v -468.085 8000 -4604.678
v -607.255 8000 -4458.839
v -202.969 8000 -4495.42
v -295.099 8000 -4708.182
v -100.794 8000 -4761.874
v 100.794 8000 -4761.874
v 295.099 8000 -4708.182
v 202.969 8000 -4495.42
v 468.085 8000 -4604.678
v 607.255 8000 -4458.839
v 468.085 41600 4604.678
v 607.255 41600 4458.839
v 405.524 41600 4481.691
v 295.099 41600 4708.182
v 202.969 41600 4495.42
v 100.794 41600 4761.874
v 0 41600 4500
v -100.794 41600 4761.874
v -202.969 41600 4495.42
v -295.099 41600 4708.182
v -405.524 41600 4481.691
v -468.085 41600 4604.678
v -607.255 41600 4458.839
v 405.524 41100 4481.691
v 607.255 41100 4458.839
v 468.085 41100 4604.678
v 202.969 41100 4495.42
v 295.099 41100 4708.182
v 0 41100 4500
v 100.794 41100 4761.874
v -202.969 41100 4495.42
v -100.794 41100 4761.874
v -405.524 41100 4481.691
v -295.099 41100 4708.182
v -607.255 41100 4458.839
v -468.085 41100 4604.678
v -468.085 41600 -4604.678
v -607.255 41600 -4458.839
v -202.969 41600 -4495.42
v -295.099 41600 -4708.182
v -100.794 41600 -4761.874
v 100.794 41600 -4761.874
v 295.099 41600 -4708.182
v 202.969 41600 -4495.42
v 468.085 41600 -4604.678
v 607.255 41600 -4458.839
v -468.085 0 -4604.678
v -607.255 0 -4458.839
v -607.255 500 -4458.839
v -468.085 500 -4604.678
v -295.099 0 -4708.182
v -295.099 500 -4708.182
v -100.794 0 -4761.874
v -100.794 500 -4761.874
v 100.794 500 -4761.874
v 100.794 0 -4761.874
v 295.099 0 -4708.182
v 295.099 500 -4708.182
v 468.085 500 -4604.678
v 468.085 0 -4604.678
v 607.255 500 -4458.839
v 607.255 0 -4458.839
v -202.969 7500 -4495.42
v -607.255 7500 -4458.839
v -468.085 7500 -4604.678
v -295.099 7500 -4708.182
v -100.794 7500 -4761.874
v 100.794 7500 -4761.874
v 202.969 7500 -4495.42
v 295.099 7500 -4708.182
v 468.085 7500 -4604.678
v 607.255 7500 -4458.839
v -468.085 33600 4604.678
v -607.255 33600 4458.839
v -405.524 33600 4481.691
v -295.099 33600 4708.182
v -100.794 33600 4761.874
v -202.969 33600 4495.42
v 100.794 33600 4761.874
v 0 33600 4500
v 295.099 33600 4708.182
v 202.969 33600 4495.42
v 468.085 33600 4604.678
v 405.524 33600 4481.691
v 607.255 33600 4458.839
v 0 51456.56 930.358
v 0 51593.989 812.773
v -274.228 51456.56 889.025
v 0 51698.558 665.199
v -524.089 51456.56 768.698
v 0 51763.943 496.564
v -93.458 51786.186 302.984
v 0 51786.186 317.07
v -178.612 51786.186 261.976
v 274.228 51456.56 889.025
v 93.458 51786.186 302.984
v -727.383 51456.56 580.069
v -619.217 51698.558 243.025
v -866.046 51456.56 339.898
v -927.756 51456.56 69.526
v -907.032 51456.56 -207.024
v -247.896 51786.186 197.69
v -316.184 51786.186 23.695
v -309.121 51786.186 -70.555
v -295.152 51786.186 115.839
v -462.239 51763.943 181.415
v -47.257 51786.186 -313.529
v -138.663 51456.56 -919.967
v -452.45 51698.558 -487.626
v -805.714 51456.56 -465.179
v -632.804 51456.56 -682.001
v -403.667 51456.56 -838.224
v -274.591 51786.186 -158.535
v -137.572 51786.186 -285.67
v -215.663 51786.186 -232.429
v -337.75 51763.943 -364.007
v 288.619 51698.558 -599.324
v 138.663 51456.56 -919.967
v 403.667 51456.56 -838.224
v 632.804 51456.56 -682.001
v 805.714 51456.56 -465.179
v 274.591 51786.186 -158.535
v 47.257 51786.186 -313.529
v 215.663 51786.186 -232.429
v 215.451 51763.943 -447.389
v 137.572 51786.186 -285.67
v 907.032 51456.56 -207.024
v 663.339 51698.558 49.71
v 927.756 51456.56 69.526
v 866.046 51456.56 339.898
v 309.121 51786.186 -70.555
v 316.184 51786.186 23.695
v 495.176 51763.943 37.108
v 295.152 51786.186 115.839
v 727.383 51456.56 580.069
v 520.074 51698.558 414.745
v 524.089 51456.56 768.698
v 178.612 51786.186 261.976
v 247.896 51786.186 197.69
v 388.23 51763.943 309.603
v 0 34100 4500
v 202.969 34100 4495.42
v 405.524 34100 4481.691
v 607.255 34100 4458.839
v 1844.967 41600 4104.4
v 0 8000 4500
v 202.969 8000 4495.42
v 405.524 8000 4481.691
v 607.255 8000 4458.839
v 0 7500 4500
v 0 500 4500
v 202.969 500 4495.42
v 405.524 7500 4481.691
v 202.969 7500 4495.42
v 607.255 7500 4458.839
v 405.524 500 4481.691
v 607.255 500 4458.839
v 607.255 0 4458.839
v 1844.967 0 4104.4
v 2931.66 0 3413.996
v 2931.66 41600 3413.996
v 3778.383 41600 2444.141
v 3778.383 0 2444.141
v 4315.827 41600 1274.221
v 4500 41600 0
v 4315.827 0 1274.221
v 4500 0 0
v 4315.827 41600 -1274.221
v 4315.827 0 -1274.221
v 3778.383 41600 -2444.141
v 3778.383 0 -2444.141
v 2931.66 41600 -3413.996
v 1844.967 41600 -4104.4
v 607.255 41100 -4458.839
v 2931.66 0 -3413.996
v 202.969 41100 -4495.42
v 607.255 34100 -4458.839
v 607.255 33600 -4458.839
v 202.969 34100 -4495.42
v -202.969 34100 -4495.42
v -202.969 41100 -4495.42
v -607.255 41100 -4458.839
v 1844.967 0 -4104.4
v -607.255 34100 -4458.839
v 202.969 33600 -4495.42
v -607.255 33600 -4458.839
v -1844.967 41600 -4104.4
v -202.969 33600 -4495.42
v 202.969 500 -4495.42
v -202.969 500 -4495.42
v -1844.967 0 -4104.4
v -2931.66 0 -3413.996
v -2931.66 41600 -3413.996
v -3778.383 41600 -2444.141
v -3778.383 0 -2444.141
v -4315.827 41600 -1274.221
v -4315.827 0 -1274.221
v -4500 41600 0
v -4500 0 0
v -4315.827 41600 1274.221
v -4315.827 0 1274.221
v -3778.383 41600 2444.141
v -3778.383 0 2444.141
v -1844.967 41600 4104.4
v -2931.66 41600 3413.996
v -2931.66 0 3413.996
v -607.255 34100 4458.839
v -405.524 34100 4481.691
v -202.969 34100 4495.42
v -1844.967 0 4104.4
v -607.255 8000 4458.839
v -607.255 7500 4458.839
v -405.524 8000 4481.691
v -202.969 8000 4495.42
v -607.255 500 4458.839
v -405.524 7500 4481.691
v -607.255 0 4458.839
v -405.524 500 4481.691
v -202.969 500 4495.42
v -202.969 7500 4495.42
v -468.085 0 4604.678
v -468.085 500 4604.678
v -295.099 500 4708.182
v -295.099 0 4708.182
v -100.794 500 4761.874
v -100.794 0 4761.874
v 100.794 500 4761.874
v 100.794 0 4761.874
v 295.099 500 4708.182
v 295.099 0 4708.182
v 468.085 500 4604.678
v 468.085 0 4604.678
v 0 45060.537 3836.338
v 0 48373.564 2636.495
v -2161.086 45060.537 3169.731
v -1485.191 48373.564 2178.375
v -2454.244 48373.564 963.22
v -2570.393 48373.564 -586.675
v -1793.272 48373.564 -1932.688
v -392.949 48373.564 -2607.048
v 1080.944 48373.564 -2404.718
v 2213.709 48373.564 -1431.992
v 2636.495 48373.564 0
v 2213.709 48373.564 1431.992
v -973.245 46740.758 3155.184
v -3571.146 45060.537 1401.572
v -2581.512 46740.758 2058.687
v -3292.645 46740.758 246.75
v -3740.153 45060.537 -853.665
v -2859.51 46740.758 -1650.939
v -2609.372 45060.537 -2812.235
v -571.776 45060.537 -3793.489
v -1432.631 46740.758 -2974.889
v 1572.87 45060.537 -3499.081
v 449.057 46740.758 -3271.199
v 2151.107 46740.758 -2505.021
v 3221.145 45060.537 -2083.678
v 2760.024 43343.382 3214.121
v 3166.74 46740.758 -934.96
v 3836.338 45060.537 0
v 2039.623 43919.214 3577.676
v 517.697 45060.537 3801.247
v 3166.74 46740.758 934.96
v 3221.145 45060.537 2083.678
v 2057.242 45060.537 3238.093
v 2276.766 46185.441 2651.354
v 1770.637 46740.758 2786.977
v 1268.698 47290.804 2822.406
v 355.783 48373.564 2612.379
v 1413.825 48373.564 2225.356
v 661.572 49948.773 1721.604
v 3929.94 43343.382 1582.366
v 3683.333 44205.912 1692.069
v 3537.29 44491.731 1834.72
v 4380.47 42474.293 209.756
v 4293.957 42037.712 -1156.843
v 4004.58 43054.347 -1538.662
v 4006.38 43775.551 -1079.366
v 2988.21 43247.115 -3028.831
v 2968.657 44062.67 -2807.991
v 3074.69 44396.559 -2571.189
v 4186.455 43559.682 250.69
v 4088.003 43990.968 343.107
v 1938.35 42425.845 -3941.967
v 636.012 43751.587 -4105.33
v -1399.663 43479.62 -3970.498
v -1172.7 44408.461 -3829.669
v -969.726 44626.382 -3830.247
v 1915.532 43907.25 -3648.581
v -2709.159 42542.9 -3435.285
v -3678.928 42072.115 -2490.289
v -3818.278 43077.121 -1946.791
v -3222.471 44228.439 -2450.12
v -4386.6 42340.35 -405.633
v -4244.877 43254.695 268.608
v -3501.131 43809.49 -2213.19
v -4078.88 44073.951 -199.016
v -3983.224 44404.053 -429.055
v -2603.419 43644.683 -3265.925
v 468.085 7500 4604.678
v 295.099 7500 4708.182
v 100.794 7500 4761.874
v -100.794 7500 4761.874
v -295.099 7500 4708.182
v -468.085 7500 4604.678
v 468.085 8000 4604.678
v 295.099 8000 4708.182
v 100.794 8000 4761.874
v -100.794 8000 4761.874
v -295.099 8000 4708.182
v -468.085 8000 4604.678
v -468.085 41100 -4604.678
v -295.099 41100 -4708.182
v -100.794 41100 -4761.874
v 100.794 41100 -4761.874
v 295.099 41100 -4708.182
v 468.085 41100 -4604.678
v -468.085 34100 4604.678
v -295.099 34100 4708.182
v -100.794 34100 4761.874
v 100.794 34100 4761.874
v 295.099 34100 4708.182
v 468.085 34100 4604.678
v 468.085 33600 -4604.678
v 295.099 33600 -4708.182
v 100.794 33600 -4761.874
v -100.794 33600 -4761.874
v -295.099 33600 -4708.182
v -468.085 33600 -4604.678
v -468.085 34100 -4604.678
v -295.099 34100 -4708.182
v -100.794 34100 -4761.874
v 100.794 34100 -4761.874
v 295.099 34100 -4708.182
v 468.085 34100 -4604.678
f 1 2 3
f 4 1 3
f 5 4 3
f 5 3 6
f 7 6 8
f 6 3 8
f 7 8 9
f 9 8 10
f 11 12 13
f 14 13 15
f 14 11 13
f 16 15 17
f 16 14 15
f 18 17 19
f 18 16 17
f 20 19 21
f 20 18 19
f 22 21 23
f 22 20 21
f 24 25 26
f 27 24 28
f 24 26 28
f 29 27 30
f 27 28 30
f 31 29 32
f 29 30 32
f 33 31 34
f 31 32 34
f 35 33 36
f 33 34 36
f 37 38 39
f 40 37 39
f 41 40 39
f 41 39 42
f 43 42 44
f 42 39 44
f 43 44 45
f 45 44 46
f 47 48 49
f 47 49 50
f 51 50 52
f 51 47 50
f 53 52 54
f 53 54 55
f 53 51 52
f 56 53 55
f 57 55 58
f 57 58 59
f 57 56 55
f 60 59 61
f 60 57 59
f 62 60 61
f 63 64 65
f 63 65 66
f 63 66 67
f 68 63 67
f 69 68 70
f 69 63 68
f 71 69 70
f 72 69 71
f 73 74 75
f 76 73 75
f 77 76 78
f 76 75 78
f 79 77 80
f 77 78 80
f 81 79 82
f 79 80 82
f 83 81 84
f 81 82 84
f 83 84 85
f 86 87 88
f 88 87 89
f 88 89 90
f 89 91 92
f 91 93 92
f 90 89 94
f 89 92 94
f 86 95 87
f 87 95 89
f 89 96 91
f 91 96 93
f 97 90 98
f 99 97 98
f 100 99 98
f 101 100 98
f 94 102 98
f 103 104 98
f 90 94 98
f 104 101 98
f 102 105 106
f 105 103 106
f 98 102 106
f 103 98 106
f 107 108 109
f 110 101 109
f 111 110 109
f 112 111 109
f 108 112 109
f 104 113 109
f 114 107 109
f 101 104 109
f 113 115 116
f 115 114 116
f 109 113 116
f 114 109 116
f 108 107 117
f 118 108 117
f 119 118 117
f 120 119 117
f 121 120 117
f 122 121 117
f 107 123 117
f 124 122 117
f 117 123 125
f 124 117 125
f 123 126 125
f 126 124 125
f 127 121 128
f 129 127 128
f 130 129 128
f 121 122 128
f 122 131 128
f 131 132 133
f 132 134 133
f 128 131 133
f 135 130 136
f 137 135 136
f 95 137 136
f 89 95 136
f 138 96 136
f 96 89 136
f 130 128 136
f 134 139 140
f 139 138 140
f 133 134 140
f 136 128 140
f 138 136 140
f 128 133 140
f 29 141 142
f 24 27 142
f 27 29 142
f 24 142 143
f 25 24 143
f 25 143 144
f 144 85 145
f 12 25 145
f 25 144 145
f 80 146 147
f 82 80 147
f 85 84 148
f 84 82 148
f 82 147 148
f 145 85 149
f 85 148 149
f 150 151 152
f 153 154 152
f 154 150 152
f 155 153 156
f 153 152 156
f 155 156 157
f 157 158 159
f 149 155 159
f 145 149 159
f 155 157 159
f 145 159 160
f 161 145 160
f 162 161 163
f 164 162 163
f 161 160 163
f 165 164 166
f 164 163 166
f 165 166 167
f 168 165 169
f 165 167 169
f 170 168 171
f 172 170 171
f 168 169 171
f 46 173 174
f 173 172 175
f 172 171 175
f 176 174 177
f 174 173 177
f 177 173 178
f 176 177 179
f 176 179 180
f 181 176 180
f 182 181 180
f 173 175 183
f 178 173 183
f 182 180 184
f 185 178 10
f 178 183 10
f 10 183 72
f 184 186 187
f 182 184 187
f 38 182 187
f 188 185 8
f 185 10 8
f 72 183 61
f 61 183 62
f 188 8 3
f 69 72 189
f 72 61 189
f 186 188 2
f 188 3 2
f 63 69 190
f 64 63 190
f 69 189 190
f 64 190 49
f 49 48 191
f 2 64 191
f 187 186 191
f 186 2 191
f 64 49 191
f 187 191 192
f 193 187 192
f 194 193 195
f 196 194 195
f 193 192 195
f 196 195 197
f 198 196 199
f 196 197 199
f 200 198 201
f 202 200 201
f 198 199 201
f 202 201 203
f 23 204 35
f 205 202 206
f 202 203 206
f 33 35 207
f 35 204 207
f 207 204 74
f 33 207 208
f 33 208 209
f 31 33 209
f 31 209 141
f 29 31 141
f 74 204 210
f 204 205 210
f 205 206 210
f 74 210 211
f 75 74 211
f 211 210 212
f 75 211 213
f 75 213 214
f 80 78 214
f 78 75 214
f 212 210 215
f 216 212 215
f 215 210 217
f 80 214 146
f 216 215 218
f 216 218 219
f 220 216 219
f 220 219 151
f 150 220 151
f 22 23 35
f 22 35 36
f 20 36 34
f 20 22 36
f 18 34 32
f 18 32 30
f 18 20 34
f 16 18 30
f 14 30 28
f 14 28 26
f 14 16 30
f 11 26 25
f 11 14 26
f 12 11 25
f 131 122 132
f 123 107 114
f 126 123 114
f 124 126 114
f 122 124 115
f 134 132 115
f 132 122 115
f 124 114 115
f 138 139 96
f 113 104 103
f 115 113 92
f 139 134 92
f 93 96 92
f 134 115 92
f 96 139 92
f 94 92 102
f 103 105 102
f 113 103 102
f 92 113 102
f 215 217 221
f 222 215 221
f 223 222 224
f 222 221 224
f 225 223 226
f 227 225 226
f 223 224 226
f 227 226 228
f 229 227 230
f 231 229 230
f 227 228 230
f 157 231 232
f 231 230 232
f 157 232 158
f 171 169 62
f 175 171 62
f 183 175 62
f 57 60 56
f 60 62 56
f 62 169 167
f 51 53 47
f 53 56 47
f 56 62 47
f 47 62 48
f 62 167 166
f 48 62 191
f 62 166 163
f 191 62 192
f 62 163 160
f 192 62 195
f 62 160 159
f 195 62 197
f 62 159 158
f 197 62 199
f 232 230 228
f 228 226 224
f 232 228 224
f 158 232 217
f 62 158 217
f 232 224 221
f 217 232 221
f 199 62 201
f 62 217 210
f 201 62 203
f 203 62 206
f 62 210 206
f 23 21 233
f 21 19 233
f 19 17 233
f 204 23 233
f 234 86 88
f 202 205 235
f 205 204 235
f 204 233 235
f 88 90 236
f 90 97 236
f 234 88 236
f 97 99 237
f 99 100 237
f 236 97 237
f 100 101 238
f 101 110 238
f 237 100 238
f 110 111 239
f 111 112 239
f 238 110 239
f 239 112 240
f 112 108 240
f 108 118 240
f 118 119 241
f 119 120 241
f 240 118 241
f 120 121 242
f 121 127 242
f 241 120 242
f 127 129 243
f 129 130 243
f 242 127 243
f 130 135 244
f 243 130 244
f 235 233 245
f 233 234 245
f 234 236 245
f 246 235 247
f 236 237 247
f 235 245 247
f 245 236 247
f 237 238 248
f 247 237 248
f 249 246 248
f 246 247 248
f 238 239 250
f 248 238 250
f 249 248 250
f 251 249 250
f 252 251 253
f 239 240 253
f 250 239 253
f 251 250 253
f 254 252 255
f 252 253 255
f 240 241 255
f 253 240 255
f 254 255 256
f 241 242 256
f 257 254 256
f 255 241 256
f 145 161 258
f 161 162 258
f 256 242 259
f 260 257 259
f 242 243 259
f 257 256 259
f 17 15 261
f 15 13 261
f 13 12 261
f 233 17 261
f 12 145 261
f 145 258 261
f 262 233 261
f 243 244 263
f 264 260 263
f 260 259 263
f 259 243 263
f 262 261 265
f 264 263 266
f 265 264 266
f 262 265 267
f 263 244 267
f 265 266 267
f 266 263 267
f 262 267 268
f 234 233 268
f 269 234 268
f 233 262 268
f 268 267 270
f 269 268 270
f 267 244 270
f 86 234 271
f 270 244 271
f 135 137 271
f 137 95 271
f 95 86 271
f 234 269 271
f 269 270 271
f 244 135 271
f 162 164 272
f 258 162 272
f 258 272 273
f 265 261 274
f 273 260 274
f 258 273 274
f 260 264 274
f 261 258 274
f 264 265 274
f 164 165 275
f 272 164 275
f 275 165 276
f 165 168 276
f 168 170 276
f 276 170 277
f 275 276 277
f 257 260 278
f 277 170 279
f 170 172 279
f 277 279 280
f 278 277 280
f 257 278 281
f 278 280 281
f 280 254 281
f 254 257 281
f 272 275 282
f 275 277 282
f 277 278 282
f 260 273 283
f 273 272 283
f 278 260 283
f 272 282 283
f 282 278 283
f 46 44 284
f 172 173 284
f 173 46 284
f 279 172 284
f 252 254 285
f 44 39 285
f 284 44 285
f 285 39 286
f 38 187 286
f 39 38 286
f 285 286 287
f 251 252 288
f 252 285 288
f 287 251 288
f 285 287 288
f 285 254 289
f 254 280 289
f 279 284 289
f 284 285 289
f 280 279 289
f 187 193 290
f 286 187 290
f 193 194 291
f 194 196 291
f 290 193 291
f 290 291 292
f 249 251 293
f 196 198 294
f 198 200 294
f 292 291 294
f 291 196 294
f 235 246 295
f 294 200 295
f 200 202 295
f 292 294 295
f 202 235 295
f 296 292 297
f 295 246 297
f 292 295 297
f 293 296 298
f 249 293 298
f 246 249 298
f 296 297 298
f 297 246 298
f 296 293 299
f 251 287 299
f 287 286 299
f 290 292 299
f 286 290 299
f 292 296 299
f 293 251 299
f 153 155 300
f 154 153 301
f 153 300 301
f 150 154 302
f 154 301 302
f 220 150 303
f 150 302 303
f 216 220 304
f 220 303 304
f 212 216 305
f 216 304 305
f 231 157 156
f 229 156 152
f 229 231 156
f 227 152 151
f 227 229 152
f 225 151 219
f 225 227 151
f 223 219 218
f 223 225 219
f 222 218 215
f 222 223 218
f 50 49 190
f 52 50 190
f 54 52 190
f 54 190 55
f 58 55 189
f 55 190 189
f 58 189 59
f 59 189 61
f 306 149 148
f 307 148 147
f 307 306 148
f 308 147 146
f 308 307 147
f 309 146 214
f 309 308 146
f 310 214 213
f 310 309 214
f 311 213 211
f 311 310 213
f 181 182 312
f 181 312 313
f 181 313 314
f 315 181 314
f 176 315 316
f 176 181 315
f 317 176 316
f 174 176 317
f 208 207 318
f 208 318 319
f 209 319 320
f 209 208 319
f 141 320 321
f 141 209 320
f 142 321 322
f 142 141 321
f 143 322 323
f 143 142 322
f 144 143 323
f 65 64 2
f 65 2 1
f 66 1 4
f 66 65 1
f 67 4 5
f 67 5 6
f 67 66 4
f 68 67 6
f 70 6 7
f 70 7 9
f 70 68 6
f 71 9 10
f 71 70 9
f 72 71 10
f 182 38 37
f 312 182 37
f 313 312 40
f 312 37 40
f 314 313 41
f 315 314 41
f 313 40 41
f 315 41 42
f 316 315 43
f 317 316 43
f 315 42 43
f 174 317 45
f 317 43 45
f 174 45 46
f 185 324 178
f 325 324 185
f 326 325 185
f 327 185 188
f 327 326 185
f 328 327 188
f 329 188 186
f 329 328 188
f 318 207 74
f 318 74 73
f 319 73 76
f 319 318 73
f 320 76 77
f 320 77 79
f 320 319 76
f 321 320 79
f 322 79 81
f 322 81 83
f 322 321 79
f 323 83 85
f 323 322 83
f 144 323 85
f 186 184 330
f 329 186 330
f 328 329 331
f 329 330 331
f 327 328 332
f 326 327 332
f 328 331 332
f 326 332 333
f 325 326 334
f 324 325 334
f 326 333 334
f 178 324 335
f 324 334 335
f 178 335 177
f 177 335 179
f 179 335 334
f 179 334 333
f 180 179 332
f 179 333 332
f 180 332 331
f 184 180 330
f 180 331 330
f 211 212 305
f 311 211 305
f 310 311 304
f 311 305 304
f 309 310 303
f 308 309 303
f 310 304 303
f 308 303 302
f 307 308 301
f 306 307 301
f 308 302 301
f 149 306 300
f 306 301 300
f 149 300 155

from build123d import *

# Parameters (mm, degrees)
SKETCH1_R            = 4500
BOSS_EXTRUDE1_DEPTH  = 41600
BOSS_EXTRUDE3_DEPTH  = 500
LPATTERN1_COUNT      = 2
LPATTERN1_PITCH      = 7500
MIRROR1_COPY_1_DEPTH = 500


with BuildPart() as part:
    # Sketch1 → Boss-Extrude1 (new body)
    with BuildSketch(Plane(origin=(0, 0, 0), x_dir=(1, 0, 0), z_dir=(0, 1, 0))):
        with Locations(Location((0, 0, 0), (0, 0, 270))):
            Circle(SKETCH1_R)
    extrude(amount=BOSS_EXTRUDE1_DEPTH)

    # Sketch2 → Revolve1 (revolve)
    with BuildSketch(Plane.XY, mode=Mode.PRIVATE) as revolve1_sk:
        with BuildLine():
            Line((0, 51786.186061753), (0, 41600))
            Line((0, 41600), (4500, 41600))
            ThreePointArc((4500, 41600), (3301.877219766, 46740.757920493), (930.357921809, 51456.559698881))
            ThreePointArc((930.357921809, 51456.559698881), (665.199319271, 51698.55834057), (317.070306462, 51786.186061753))
            Line((317.070306462, 51786.186061753), (0, 51786.186061753))
        make_face()
    revolve(revolve1_sk.sketch.rotate(Axis((0, 51786.186061753, 0), (0, -1, 0)), 90), axis=Axis((0, 51786.186061753, 0), (0, -1, 0)))

    # Sketch4 → Boss-Extrude3 (add)
    with BuildSketch(Plane.XZ):
        with BuildLine():
            ThreePointArc((-607.254747717, -4458.83860118), (0, -4768.677640422), (607.254747717, -4458.83860118))
            ThreePointArc((607.254747717, -4458.83860118), (0, -4500), (-607.254747717, -4458.83860118))
        make_face()
        with BuildLine():
            ThreePointArc((-607.254747717, 4458.83860118), (0, 4768.677640422), (607.254747717, 4458.83860118))
            ThreePointArc((607.254747717, 4458.83860118), (0, 4500), (-607.254747717, 4458.83860118))
        make_face()
    boss_extrude3 = extrude(amount=-BOSS_EXTRUDE3_DEPTH)

    # LPattern1: Boss-Extrude3 ×2
    with Locations(*[(0, i * LPATTERN1_PITCH, 0) for i in range(1, LPATTERN1_COUNT)]):
        add(boss_extrude3)

    # Mirror1: Boss-Extrude3 across plane
    add(boss_extrude3.mirror(Plane(origin=(0, 20800, 0), x_dir=(0, 0, 1), z_dir=(0, -1, 0))))

    # Mirror1 copy 1 sketch → Mirror1 copy 1 (add)
    with BuildSketch(Plane(origin=(0, 34100, 0), x_dir=(1, 0, 0), z_dir=(0, 1, 0))):
        with BuildLine():
            ThreePointArc((-607.254747717, 4458.83860118), (0, 4768.677640422), (607.254747717, 4458.83860118))
            ThreePointArc((607.254747717, 4458.83860118), (0, 4500), (-607.254747717, 4458.83860118))
        make_face()
        with BuildLine():
            ThreePointArc((-607.254747717, -4458.83860118), (0, -4768.677640422), (607.254747717, -4458.83860118))
            ThreePointArc((607.254747717, -4458.83860118), (0, -4500), (-607.254747717, -4458.83860118))
        make_face()
    extrude(amount=-MIRROR1_COPY_1_DEPTH)


solid = part.part
